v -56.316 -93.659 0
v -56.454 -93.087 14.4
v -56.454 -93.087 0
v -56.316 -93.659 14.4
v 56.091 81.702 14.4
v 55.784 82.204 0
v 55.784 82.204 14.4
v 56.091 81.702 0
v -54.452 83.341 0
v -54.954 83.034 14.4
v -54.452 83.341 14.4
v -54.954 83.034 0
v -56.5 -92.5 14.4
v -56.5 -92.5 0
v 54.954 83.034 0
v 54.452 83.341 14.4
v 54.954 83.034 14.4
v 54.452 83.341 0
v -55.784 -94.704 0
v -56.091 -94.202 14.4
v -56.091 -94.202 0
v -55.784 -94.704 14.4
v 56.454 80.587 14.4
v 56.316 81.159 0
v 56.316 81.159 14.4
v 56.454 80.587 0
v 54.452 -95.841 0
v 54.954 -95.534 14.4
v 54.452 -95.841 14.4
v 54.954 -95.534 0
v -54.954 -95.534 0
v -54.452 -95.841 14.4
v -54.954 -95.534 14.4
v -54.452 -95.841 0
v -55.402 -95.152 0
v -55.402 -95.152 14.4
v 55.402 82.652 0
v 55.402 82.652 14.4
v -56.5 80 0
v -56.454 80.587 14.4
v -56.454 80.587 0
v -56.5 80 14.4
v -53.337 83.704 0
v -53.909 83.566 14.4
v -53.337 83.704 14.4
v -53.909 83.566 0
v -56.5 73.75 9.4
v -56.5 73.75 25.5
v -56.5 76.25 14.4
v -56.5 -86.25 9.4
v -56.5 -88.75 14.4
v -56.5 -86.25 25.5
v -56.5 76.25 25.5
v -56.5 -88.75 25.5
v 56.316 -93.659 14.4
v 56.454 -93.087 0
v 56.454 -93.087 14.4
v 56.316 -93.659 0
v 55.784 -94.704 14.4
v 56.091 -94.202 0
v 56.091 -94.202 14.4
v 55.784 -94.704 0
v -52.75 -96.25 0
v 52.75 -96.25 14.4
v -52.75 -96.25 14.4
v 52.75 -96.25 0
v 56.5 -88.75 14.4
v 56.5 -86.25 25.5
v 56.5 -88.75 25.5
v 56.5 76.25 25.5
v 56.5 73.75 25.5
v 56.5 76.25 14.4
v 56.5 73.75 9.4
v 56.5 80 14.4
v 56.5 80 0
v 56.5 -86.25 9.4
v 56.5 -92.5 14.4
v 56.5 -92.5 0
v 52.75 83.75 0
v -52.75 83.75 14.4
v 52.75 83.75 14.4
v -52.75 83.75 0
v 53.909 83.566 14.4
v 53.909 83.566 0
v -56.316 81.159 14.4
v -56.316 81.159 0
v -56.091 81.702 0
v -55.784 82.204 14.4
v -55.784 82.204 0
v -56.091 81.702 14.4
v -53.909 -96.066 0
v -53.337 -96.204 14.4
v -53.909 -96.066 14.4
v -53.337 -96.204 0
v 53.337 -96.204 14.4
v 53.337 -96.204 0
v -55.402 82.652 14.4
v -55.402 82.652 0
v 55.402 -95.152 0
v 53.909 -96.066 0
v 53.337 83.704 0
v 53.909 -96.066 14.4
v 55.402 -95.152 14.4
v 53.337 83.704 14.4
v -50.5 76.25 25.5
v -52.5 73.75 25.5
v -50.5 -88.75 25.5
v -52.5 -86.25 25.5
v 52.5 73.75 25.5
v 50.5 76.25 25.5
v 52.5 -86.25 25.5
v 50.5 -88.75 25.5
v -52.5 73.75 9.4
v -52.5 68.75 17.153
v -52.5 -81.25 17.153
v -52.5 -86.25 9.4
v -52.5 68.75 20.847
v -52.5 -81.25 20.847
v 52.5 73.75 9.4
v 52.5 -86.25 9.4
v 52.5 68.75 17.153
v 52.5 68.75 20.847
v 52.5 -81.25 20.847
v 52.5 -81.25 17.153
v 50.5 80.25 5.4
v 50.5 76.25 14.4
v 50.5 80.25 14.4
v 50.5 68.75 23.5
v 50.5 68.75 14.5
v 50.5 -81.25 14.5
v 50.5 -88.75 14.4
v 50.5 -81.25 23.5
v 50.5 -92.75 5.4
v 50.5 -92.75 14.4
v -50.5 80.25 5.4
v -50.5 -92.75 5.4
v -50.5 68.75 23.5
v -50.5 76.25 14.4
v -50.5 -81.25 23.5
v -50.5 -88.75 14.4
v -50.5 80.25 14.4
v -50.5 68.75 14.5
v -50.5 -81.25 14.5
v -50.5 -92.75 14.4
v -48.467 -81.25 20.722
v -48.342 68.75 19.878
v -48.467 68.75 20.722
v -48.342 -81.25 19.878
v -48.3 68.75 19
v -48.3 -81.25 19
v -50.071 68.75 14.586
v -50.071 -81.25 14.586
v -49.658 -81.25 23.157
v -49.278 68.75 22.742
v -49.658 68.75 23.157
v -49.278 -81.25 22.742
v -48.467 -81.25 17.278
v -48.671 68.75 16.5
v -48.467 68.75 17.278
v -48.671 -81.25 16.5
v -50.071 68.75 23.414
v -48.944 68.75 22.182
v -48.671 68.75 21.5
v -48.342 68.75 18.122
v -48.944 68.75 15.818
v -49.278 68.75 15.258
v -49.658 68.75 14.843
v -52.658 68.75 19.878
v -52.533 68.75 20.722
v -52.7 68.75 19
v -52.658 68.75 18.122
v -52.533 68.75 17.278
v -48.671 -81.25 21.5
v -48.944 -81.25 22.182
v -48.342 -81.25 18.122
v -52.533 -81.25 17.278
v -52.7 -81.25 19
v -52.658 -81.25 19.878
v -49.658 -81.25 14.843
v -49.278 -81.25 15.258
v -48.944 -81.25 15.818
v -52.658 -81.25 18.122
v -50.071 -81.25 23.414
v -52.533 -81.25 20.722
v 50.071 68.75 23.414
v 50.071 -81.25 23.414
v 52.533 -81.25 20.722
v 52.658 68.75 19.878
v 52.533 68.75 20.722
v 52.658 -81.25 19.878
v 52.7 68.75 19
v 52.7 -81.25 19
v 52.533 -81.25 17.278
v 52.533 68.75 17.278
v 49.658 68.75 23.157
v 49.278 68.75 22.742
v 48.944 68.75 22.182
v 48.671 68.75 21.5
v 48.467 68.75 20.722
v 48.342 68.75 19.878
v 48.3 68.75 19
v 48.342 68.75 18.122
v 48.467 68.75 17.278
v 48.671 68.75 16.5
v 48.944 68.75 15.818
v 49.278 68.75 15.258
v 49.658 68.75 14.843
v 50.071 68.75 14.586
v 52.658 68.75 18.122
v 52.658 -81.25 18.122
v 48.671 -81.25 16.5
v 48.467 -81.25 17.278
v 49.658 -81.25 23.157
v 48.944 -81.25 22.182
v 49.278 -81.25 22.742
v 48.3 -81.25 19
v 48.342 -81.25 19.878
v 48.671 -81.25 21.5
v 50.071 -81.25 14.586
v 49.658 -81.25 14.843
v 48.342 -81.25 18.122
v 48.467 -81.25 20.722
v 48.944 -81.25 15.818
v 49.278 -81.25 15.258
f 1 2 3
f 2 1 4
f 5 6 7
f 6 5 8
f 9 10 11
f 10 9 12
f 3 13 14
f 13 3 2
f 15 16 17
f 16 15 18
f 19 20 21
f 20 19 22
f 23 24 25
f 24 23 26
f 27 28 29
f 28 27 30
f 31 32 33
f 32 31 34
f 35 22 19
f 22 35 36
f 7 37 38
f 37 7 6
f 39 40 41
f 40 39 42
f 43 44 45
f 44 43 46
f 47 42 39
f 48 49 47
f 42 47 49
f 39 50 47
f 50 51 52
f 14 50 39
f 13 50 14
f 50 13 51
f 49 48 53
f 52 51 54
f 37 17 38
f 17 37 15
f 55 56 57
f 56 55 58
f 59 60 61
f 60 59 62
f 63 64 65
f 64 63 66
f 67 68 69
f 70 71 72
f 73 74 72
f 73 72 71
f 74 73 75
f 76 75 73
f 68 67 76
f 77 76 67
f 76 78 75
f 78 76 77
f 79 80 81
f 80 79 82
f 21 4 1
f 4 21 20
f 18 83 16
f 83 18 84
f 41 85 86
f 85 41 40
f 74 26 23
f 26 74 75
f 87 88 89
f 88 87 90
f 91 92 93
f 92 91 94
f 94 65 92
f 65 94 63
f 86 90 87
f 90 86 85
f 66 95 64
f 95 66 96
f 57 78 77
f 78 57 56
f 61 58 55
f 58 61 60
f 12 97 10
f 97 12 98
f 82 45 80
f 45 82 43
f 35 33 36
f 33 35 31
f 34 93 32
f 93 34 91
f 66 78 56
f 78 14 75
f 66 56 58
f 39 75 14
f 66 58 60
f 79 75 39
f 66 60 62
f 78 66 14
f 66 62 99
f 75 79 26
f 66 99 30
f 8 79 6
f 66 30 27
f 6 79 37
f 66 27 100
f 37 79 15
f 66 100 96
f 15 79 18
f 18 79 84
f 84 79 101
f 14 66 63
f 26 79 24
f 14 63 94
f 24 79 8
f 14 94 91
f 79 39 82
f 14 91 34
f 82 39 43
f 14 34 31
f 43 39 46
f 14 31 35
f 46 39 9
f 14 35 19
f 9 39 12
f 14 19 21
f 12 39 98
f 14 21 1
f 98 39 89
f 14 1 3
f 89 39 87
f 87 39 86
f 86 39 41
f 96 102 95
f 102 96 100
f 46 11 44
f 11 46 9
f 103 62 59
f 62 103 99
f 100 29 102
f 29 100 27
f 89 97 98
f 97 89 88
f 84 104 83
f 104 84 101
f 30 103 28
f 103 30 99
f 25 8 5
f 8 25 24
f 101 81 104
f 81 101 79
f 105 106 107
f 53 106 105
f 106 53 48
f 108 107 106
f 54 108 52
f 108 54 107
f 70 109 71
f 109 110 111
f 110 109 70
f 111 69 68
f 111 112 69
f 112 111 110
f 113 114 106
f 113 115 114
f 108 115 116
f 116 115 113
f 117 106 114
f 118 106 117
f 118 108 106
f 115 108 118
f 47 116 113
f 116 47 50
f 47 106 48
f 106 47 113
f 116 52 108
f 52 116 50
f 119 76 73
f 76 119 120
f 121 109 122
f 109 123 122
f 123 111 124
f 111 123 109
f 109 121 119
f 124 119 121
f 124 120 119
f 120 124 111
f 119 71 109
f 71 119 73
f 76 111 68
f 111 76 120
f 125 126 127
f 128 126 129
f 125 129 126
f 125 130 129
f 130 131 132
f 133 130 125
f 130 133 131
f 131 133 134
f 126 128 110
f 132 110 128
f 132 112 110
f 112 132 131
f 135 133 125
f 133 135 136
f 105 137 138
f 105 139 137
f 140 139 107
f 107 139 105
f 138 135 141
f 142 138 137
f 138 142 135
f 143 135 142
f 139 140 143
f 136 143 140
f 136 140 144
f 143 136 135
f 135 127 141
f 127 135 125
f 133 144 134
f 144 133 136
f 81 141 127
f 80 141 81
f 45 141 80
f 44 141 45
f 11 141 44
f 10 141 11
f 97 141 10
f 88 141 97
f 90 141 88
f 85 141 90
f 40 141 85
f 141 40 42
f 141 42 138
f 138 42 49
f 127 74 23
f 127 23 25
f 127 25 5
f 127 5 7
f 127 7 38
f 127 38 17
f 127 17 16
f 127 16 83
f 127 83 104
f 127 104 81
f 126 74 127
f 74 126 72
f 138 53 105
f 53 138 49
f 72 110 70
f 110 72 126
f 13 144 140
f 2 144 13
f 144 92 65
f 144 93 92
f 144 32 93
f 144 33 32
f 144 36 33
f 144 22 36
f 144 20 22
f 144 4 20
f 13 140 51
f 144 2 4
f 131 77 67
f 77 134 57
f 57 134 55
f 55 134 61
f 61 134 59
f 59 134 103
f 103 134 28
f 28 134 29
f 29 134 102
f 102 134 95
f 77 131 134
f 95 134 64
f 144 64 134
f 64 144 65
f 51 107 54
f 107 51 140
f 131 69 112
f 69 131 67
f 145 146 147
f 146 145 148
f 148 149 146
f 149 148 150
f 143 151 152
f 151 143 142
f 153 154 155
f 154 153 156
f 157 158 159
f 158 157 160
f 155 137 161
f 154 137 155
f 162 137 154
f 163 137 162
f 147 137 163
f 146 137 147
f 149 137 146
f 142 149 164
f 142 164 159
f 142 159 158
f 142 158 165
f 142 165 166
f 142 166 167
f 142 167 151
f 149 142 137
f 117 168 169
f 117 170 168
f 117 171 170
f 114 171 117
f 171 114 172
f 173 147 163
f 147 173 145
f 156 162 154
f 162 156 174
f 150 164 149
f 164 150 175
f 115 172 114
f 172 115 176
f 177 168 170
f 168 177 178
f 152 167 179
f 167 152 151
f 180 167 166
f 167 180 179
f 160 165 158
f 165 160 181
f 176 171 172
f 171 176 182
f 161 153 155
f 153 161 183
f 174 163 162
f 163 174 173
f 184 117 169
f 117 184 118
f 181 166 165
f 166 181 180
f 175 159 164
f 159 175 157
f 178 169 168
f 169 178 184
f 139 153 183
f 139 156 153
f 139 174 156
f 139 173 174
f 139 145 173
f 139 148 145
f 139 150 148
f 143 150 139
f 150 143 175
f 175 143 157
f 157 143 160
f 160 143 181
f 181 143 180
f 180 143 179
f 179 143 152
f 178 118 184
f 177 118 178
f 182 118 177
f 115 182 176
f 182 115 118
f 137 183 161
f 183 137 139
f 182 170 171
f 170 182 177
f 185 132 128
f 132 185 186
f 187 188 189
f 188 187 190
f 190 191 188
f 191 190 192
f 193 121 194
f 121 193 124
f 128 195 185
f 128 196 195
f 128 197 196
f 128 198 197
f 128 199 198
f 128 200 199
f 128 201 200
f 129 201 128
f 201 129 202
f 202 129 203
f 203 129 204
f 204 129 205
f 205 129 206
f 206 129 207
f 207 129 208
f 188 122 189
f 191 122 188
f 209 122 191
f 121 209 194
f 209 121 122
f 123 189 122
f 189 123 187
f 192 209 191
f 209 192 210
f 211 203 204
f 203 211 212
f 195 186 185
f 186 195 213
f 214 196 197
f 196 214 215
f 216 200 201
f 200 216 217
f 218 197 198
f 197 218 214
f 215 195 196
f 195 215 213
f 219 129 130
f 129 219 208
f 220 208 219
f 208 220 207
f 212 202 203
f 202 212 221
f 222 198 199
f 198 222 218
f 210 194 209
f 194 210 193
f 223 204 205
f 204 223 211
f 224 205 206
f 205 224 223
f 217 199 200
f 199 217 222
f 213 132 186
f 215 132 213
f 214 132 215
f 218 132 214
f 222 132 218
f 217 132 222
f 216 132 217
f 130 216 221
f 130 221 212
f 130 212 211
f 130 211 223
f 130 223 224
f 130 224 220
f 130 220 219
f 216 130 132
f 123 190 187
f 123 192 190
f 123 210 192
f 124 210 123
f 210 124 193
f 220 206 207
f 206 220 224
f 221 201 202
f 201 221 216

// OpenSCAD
// file: ../bin_shortkiller.scad
// bin_shortkiller — a Gridfinity bin that cradles the Shortkiller.
//
// FOOT is NX_CRADLE x NY_CRADLE cells of stock Gridfinity, so it clicks into
// the ENGINDOT plate — or any other Clickfinity / Gridfinity baseplate. BODY
// flares out above the foot in BOTH axes:
//
//   * ACROSS, to clear a box wider than the grid, so the plate can stay narrow
//     and hug the supply
//   * FORWARD, to make room for a lip at each end. The box is 171 mm and a
//     4-cell foot is 167.5, so without this there is nothing for a front lip to
//     stand on. The extension is entirely at the front — a rear one would run
//     into the probe bucket in the next cell.
//
// Both flares are 45-degree ramps finishing below the pocket floor. A step
// instead of a ramp needs support; a ramp running past the floor would have the
// pocket cut the side walls away where they are still narrow.
//
// Not a stock bin(): the box is operated in place, so both end lips are LOW —
// the rear clears the DC jack and rocker, the front clears the GX12 connector
// and the V+/V- buttons.
//
// Parameters let one module serve every coupon, so they cannot drift:
//   foot  = false  swap the Gridfinity base for a flat slab (grip coupon)
//   lips  = false  open front, no forward extension (original cross-section)
//
// PRINT: flat, foot down, no supports. PETG if it lives in a Clickfinity plate.
include <../lib/gridfinity.scad>
include <shortkiller_common.scad>

GRIP_BASE_T = 3.0;   // flat base thickness when foot = false
FUSE        = 0.05;  // overlap between the feet and the flare above them.
                     //   The feet top out at BIN_BASE_H and the flare used to
                     //   START there — coplanar faces, which the two OpenSCAD
                     //   builds this repo must satisfy resolve differently:
                     //   2021.01 (CI) and 2026.06 (dev) each produced a
                     //   non-manifold mesh for one rounding construction and a
                     //   clean one for the other, in OPPOSITE directions.
                     //   Overlapping them sidesteps the disagreement entirely.

// Rounded rect via the SAME offset idiom lib/gridfinity.scad uses. Verified on
// both engines this repo has to satisfy:
//
//   construction        OpenSCAD 2021.01 (CI)   OpenSCAD 2026.06 (dev)
//   hull of circles     NON-MANIFOLD            clean
//   offset(R) offset(-R) clean                  clean  (at $fn = 40)
//
// An earlier revision used a hull of four circles, on the theory that the offset
// round-trip was the fragile one. That was backwards: it is clean here and it is
// what 2021.01 chokes on. Matching lib/gridfinity.scad's own construction also
// means the union with bin_blank's block never mixes two roundings.
module _rrect(w, d) { offset(r = BIN_R) offset(r = -BIN_R) square([w, d], center = true); }

module grip_bump(side, len, top_z, yc) {
    // Ridge running fore-aft on the flexure's inner face. Horizontal axis so the
    // box cams the flexure outward as it drops in, instead of catching on it.
    translate([side * POCKET_W / 2, yc, top_z - BUMP_H / 2 - 2])
        scale([BUMP_REACH / (BUMP_H / 2), 1, 1])
            rotate([90, 0, 0])
                cylinder(r = BUMP_H / 2, h = len, center = true, $fn = 32);
}

module bin_shortkiller(ny = NY_CRADLE, foot = true, lips = true) {
    D       = ny * GF - 0.5;              // foot length
    ext     = lips ? FRONT_EXT : 0;       // forward overhang past the foot
    BD      = D + ext;                    // body length
    yc      = -ext / 2;                   // body centre, shifted forward
    y_front = -(D / 2 + ext);             // body front face
    y_rear  = D / 2;                      // body rear face

    base_h  = foot ? BIN_BASE_H + CHAMF : GRIP_BASE_T;
    floor_z = base_h + FLOOR_T;
    top_z   = floor_z + (BIN_H - FLOOR_Z);  // identical grip geometry either way

    // pocket runs between the two lip inner faces
    p_front = lips ? y_front + LIP_T : y_front - 10;
    p_rear  = y_rear - BACKSTOP_T;

    union() {
        difference() {
            union() {
                if (foot) {
                    // Feet only — deliberately NOT bin_blank(). bin_blank builds
                    // its block with offset(R) offset(-R) square(), while the
                    // flare below uses _rrect (hull of circles). Unioning two
                    // nominally identical rectangles built different ways leaves
                    // faces coincident to within tessellation error, and the mesh
                    // goes non-manifold on some OpenSCAD builds but not others —
                    // it passed locally and failed in CI. One construction only.
                    for (ix = [0 : NX_CRADLE-1], iy = [0 : ny-1])
                        translate([(ix - (NX_CRADLE-1)/2) * GF,
                                   (iy - (ny-1)/2) * GF, 0]) _bin_foot();

                    // 45-degree flare, grid footprint out to body footprint
                    hull() {
                        translate([0, 0, BIN_BASE_H - FUSE])
                            linear_extrude(EPS) _rrect(FOOT_W, D);
                        translate([0, yc, BIN_BASE_H + CHAMF])
                            linear_extrude(EPS) _rrect(BODY_W, BD);
                    }
                } else {
                    translate([0, yc, 0])
                        linear_extrude(GRIP_BASE_T) _rrect(BODY_W, BD);
                }

                // straight body above the base
                translate([0, yc, base_h])
                    linear_extrude(top_z - base_h) _rrect(BODY_W, BD);
            }

            // pocket
            translate([-POCKET_W / 2, p_front, floor_z])
                cube([POCKET_W, p_rear - p_front, top_z]);

            // rear lip trimmed to BACKSTOP_H. Overshoot INTO the pocket — a cut
            // ending flush with the pocket face leaves a coincident face and the
            // mesh goes non-manifold.
            translate([-BODY_W / 2 - 1, p_rear - 4, floor_z + BACKSTOP_H])
                cube([BODY_W + 2, BACKSTOP_T + 6, top_z]);

            // front lip trimmed to FRONT_LIP_H, same overshoot
            if (lips)
                translate([-BODY_W / 2 - 1, y_front - 1, floor_z + FRONT_LIP_H])
                    cube([BODY_W + 2, LIP_T + 5, top_z]);

            // flexure relief — thin each side wall from its OUTER face, inset
            // from both ends so the rounded outer corners stay solid
            for (s = [-1, 1])
                translate([s > 0 ? POCKET_W / 2 + FLEX_T : -BODY_W / 2 - 2,
                           y_front + RELIEF_INSET,
                           floor_z + FLEX_START])
                    cube([SIDE_WALL - FLEX_T + 2,
                          BD - 2 * RELIEF_INSET,
                          top_z]);
        }

        for (s = [-1, 1])
            grip_bump(s, BD - 2 * RELIEF_INSET - 10, top_z, yc);
    }
}

bin_shortkiller();
// main file
// bin_shortkiller_griptest — FULL-LENGTH grip coupon. No Gridfinity base.
//
// The one thing bin_shortkiller_testfit could NOT tell you: how the flexures
// behave at their real span. That coupon is 2 cells, so its walls span ~63 mm
// against the real 147 mm, and beam stiffness goes as 1/length^3 — it grips
// several times too hard. This part has the true span.
//
// It also skips the entire Gridfinity base. In the real bin the pocket floor
// sits 21.9 mm up — feet, then the 45-degree flare ramp, then the floor — and
// none of that is doing anything for grip. Here it is a 3 mm slab instead.
// Everything above the floor is IDENTICAL geometry, from the same module.
//
// What it answers:
//   * do the bumps hold the box, or does it rock, at full span
//   * does the 9 mm backstop clear the rear DC jack and rocker
//   * does the box overhang look right at 171 mm in a 167.5 mm bin
//
// What it cannot answer: anything about seating in a plate — it has no foot.
// bin_shortkiller_testfit already covered that.
//
// PRINT: flat, slab down, no supports.
include <../../lib/gridfinity.scad>
include <../shortkiller_common.scad>
use <../bin_shortkiller.scad>

bin_shortkiller(NY_CRADLE, foot = false);
